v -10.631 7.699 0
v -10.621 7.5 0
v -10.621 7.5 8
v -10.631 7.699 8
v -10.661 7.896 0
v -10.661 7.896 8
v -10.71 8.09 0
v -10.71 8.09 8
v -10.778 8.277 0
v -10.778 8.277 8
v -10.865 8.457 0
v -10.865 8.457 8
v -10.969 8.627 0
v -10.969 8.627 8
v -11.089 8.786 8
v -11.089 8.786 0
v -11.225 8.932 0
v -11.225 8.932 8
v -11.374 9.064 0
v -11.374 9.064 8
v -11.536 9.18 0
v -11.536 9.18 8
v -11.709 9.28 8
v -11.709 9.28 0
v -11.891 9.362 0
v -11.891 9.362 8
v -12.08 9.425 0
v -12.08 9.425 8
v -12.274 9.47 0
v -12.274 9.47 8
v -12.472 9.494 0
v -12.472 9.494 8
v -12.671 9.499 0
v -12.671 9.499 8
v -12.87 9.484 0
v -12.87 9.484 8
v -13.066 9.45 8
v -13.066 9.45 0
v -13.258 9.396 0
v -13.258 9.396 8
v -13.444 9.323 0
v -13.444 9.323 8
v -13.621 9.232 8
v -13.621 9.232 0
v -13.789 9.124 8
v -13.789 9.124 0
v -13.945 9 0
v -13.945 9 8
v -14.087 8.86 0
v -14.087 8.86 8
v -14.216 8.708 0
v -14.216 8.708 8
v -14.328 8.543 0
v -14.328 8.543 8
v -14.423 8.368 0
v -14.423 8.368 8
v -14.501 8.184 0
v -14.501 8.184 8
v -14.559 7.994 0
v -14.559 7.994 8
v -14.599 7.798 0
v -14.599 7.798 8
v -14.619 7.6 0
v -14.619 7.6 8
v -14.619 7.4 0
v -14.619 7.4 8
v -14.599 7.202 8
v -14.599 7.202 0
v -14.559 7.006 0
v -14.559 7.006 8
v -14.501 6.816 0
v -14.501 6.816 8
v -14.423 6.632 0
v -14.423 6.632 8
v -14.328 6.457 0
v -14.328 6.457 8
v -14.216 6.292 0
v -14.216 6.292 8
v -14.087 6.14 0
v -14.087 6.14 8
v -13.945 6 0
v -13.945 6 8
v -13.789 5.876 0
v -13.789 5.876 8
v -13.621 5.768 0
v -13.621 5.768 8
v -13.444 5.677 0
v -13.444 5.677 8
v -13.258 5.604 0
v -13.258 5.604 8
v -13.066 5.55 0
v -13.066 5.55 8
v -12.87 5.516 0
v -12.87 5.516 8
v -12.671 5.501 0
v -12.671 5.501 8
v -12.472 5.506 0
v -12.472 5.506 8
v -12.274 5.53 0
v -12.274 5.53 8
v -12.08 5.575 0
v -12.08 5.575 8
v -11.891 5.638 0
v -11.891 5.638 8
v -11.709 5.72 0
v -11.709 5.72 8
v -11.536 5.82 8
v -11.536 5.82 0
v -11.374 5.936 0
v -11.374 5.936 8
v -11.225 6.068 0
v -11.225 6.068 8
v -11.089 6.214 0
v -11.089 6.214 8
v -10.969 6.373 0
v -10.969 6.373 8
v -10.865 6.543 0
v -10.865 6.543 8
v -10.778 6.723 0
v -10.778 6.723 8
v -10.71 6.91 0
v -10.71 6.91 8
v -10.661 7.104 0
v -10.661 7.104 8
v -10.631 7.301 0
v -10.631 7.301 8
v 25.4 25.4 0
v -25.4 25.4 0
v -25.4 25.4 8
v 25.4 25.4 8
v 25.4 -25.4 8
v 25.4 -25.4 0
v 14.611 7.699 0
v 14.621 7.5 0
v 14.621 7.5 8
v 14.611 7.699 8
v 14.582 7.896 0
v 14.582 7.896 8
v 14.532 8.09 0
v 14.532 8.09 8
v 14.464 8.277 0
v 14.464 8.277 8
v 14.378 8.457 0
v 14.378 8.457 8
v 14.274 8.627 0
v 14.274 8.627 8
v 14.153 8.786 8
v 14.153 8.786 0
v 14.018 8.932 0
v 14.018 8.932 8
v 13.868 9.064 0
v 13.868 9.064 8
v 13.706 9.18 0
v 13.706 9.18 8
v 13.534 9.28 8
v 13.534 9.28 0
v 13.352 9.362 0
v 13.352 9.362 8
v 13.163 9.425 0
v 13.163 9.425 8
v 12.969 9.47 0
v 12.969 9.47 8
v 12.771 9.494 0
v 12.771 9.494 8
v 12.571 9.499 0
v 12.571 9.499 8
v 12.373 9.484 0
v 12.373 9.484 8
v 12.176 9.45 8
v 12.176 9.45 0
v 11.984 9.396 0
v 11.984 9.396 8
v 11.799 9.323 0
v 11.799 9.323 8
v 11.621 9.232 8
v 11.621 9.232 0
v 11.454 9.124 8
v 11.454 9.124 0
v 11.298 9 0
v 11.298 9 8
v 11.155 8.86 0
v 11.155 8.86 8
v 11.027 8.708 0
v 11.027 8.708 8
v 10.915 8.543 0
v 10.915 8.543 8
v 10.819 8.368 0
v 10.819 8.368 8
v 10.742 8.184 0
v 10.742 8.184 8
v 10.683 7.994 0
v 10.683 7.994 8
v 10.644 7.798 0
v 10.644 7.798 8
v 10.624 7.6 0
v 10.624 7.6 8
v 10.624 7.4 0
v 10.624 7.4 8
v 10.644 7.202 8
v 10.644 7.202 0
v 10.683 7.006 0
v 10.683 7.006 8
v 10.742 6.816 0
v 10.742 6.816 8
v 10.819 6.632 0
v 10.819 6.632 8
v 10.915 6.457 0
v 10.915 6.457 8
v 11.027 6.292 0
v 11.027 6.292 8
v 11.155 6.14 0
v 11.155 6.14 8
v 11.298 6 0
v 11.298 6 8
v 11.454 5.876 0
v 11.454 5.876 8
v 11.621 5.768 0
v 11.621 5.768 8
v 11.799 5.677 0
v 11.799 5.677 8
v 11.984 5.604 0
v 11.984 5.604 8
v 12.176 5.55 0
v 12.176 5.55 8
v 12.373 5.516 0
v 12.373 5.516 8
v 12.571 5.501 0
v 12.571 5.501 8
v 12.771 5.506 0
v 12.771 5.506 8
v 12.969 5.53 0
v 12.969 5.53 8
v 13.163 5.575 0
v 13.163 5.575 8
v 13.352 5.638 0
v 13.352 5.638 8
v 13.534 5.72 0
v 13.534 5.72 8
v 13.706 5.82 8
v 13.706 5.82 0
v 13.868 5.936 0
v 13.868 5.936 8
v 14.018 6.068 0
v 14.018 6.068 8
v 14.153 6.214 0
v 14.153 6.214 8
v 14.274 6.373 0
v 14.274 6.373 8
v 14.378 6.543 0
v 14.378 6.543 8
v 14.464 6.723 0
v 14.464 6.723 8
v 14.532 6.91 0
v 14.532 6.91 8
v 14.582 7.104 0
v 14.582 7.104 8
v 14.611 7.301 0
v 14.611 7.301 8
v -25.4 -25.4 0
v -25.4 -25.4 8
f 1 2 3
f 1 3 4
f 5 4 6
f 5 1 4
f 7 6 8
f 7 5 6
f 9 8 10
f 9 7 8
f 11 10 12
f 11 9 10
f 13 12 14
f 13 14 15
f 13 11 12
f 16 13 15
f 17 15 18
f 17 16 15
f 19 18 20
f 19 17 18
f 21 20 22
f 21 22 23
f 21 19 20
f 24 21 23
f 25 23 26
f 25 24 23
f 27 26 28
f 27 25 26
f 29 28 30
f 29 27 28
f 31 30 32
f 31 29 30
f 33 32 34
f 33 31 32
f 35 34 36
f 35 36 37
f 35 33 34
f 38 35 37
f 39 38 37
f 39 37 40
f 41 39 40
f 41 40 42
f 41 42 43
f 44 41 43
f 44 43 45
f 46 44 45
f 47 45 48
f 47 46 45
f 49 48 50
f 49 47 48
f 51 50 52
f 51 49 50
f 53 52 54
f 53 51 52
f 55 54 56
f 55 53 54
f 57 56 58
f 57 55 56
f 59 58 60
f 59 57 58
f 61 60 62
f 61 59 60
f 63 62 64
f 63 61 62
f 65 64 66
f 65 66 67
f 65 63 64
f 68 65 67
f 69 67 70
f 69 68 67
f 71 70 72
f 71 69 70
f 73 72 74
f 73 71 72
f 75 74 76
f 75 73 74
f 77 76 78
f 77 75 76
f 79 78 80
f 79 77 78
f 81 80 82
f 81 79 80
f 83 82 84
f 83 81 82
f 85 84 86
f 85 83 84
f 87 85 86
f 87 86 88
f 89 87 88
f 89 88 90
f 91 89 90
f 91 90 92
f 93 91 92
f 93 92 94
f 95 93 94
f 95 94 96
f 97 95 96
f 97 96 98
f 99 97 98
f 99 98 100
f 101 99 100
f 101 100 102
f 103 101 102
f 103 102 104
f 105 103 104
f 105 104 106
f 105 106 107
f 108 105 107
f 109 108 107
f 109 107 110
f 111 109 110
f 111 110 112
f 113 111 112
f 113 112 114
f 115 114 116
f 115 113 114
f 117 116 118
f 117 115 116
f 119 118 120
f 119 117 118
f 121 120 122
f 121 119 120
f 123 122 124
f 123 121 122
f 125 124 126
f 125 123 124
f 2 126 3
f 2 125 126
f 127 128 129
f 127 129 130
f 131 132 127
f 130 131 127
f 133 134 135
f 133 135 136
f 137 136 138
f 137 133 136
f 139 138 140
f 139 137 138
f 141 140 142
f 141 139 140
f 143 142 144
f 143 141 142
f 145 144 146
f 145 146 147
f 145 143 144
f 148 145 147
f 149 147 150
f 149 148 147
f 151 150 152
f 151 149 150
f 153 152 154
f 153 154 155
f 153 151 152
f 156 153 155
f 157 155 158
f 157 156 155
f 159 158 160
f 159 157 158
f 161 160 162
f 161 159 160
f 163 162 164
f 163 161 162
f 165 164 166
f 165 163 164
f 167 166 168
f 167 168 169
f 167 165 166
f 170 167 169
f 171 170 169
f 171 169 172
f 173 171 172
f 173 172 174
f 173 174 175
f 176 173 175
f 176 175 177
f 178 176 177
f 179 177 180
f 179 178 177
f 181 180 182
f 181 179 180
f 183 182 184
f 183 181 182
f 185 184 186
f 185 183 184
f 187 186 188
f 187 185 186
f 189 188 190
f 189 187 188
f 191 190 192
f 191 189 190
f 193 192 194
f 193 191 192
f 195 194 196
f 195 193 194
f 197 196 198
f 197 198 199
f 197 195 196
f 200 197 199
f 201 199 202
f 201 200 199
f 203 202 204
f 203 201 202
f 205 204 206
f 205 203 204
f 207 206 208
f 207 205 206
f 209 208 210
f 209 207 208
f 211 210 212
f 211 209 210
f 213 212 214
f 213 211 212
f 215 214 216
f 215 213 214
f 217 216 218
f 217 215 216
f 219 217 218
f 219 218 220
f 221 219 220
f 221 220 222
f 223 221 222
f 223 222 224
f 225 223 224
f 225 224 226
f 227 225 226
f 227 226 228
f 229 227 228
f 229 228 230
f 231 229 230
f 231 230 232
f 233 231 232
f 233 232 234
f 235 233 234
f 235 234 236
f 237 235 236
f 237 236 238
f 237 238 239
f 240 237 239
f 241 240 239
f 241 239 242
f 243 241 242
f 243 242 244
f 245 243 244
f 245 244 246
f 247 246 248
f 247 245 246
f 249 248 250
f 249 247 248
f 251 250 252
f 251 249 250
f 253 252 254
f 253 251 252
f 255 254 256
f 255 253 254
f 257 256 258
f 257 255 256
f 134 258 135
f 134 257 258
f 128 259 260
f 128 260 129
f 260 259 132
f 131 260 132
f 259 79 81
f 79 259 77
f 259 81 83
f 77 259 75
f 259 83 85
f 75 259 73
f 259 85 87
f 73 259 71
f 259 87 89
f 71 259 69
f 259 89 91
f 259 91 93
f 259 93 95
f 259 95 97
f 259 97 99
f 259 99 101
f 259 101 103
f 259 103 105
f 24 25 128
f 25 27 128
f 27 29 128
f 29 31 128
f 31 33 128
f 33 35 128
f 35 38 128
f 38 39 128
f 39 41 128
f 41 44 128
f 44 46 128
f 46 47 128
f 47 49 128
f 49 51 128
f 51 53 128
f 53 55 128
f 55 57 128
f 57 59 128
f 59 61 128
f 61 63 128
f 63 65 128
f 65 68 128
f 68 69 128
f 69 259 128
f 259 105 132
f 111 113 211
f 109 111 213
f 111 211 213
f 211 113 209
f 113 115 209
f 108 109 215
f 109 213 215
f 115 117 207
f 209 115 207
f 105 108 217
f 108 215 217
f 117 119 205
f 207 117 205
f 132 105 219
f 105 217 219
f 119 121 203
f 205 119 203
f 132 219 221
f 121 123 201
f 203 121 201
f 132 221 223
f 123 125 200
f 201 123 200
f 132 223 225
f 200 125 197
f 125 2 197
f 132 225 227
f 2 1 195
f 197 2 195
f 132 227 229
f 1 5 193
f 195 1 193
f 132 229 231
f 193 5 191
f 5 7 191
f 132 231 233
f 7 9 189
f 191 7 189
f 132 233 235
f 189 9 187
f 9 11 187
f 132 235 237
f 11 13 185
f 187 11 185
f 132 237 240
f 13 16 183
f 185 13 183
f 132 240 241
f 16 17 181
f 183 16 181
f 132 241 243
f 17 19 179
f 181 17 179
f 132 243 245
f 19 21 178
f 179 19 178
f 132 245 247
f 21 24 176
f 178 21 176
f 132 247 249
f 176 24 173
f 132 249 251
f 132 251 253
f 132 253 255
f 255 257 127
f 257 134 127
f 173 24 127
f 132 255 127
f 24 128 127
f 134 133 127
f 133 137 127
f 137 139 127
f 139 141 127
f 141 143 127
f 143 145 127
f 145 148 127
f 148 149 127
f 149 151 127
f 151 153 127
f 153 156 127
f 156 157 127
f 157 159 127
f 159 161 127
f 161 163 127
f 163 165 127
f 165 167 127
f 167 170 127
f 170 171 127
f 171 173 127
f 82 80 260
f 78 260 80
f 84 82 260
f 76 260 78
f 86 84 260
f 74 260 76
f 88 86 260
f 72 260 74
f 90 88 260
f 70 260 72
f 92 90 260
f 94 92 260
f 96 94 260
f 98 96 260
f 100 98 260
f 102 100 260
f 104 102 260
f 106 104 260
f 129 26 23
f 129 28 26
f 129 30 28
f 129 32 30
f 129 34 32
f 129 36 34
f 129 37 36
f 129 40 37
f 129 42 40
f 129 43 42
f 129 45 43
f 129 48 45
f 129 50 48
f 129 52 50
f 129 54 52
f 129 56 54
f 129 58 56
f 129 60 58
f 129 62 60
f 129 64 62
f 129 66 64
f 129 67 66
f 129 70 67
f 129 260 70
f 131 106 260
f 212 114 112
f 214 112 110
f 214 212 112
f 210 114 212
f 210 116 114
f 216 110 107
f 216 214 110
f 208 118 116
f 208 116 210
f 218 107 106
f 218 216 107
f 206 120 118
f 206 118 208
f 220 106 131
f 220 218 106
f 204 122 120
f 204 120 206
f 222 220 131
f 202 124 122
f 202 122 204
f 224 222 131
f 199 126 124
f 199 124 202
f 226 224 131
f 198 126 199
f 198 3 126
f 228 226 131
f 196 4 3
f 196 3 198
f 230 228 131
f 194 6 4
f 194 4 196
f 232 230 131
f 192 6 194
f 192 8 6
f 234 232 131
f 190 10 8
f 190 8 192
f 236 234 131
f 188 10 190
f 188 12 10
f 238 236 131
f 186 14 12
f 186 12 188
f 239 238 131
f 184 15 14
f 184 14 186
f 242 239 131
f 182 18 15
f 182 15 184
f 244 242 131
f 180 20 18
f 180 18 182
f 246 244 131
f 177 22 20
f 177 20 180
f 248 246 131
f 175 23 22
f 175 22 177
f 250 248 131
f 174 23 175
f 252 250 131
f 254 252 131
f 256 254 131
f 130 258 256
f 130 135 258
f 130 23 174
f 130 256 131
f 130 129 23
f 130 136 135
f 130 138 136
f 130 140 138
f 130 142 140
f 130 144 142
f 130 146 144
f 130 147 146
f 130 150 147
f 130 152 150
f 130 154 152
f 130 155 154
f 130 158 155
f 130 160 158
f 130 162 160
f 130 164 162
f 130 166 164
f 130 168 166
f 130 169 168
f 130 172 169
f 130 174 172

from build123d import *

# Parameters (mm, degrees)
F0_W     = 50.8
F0_H     = 50.8
F1_DEPTH = 8
F2_R     = 2
F3_DEPTH = 8


with BuildPart() as f1:
    # F0 (on Top) → F1 (new body)
    with BuildSketch(Plane.XY):
        Rectangle(F0_W, F0_H)
    extrude(amount=F1_DEPTH)

    # F2 (on Top) → F3 (cut, through all)
    with BuildSketch(Plane.XY):
        with Locations((-12.621296, 7.5)):
            Circle(F2_R)
        with Locations((12.621296, 7.5)):
            Circle(F2_R)
    extrude(amount=F3_DEPTH, mode=Mode.SUBTRACT)


solid = f1.part
